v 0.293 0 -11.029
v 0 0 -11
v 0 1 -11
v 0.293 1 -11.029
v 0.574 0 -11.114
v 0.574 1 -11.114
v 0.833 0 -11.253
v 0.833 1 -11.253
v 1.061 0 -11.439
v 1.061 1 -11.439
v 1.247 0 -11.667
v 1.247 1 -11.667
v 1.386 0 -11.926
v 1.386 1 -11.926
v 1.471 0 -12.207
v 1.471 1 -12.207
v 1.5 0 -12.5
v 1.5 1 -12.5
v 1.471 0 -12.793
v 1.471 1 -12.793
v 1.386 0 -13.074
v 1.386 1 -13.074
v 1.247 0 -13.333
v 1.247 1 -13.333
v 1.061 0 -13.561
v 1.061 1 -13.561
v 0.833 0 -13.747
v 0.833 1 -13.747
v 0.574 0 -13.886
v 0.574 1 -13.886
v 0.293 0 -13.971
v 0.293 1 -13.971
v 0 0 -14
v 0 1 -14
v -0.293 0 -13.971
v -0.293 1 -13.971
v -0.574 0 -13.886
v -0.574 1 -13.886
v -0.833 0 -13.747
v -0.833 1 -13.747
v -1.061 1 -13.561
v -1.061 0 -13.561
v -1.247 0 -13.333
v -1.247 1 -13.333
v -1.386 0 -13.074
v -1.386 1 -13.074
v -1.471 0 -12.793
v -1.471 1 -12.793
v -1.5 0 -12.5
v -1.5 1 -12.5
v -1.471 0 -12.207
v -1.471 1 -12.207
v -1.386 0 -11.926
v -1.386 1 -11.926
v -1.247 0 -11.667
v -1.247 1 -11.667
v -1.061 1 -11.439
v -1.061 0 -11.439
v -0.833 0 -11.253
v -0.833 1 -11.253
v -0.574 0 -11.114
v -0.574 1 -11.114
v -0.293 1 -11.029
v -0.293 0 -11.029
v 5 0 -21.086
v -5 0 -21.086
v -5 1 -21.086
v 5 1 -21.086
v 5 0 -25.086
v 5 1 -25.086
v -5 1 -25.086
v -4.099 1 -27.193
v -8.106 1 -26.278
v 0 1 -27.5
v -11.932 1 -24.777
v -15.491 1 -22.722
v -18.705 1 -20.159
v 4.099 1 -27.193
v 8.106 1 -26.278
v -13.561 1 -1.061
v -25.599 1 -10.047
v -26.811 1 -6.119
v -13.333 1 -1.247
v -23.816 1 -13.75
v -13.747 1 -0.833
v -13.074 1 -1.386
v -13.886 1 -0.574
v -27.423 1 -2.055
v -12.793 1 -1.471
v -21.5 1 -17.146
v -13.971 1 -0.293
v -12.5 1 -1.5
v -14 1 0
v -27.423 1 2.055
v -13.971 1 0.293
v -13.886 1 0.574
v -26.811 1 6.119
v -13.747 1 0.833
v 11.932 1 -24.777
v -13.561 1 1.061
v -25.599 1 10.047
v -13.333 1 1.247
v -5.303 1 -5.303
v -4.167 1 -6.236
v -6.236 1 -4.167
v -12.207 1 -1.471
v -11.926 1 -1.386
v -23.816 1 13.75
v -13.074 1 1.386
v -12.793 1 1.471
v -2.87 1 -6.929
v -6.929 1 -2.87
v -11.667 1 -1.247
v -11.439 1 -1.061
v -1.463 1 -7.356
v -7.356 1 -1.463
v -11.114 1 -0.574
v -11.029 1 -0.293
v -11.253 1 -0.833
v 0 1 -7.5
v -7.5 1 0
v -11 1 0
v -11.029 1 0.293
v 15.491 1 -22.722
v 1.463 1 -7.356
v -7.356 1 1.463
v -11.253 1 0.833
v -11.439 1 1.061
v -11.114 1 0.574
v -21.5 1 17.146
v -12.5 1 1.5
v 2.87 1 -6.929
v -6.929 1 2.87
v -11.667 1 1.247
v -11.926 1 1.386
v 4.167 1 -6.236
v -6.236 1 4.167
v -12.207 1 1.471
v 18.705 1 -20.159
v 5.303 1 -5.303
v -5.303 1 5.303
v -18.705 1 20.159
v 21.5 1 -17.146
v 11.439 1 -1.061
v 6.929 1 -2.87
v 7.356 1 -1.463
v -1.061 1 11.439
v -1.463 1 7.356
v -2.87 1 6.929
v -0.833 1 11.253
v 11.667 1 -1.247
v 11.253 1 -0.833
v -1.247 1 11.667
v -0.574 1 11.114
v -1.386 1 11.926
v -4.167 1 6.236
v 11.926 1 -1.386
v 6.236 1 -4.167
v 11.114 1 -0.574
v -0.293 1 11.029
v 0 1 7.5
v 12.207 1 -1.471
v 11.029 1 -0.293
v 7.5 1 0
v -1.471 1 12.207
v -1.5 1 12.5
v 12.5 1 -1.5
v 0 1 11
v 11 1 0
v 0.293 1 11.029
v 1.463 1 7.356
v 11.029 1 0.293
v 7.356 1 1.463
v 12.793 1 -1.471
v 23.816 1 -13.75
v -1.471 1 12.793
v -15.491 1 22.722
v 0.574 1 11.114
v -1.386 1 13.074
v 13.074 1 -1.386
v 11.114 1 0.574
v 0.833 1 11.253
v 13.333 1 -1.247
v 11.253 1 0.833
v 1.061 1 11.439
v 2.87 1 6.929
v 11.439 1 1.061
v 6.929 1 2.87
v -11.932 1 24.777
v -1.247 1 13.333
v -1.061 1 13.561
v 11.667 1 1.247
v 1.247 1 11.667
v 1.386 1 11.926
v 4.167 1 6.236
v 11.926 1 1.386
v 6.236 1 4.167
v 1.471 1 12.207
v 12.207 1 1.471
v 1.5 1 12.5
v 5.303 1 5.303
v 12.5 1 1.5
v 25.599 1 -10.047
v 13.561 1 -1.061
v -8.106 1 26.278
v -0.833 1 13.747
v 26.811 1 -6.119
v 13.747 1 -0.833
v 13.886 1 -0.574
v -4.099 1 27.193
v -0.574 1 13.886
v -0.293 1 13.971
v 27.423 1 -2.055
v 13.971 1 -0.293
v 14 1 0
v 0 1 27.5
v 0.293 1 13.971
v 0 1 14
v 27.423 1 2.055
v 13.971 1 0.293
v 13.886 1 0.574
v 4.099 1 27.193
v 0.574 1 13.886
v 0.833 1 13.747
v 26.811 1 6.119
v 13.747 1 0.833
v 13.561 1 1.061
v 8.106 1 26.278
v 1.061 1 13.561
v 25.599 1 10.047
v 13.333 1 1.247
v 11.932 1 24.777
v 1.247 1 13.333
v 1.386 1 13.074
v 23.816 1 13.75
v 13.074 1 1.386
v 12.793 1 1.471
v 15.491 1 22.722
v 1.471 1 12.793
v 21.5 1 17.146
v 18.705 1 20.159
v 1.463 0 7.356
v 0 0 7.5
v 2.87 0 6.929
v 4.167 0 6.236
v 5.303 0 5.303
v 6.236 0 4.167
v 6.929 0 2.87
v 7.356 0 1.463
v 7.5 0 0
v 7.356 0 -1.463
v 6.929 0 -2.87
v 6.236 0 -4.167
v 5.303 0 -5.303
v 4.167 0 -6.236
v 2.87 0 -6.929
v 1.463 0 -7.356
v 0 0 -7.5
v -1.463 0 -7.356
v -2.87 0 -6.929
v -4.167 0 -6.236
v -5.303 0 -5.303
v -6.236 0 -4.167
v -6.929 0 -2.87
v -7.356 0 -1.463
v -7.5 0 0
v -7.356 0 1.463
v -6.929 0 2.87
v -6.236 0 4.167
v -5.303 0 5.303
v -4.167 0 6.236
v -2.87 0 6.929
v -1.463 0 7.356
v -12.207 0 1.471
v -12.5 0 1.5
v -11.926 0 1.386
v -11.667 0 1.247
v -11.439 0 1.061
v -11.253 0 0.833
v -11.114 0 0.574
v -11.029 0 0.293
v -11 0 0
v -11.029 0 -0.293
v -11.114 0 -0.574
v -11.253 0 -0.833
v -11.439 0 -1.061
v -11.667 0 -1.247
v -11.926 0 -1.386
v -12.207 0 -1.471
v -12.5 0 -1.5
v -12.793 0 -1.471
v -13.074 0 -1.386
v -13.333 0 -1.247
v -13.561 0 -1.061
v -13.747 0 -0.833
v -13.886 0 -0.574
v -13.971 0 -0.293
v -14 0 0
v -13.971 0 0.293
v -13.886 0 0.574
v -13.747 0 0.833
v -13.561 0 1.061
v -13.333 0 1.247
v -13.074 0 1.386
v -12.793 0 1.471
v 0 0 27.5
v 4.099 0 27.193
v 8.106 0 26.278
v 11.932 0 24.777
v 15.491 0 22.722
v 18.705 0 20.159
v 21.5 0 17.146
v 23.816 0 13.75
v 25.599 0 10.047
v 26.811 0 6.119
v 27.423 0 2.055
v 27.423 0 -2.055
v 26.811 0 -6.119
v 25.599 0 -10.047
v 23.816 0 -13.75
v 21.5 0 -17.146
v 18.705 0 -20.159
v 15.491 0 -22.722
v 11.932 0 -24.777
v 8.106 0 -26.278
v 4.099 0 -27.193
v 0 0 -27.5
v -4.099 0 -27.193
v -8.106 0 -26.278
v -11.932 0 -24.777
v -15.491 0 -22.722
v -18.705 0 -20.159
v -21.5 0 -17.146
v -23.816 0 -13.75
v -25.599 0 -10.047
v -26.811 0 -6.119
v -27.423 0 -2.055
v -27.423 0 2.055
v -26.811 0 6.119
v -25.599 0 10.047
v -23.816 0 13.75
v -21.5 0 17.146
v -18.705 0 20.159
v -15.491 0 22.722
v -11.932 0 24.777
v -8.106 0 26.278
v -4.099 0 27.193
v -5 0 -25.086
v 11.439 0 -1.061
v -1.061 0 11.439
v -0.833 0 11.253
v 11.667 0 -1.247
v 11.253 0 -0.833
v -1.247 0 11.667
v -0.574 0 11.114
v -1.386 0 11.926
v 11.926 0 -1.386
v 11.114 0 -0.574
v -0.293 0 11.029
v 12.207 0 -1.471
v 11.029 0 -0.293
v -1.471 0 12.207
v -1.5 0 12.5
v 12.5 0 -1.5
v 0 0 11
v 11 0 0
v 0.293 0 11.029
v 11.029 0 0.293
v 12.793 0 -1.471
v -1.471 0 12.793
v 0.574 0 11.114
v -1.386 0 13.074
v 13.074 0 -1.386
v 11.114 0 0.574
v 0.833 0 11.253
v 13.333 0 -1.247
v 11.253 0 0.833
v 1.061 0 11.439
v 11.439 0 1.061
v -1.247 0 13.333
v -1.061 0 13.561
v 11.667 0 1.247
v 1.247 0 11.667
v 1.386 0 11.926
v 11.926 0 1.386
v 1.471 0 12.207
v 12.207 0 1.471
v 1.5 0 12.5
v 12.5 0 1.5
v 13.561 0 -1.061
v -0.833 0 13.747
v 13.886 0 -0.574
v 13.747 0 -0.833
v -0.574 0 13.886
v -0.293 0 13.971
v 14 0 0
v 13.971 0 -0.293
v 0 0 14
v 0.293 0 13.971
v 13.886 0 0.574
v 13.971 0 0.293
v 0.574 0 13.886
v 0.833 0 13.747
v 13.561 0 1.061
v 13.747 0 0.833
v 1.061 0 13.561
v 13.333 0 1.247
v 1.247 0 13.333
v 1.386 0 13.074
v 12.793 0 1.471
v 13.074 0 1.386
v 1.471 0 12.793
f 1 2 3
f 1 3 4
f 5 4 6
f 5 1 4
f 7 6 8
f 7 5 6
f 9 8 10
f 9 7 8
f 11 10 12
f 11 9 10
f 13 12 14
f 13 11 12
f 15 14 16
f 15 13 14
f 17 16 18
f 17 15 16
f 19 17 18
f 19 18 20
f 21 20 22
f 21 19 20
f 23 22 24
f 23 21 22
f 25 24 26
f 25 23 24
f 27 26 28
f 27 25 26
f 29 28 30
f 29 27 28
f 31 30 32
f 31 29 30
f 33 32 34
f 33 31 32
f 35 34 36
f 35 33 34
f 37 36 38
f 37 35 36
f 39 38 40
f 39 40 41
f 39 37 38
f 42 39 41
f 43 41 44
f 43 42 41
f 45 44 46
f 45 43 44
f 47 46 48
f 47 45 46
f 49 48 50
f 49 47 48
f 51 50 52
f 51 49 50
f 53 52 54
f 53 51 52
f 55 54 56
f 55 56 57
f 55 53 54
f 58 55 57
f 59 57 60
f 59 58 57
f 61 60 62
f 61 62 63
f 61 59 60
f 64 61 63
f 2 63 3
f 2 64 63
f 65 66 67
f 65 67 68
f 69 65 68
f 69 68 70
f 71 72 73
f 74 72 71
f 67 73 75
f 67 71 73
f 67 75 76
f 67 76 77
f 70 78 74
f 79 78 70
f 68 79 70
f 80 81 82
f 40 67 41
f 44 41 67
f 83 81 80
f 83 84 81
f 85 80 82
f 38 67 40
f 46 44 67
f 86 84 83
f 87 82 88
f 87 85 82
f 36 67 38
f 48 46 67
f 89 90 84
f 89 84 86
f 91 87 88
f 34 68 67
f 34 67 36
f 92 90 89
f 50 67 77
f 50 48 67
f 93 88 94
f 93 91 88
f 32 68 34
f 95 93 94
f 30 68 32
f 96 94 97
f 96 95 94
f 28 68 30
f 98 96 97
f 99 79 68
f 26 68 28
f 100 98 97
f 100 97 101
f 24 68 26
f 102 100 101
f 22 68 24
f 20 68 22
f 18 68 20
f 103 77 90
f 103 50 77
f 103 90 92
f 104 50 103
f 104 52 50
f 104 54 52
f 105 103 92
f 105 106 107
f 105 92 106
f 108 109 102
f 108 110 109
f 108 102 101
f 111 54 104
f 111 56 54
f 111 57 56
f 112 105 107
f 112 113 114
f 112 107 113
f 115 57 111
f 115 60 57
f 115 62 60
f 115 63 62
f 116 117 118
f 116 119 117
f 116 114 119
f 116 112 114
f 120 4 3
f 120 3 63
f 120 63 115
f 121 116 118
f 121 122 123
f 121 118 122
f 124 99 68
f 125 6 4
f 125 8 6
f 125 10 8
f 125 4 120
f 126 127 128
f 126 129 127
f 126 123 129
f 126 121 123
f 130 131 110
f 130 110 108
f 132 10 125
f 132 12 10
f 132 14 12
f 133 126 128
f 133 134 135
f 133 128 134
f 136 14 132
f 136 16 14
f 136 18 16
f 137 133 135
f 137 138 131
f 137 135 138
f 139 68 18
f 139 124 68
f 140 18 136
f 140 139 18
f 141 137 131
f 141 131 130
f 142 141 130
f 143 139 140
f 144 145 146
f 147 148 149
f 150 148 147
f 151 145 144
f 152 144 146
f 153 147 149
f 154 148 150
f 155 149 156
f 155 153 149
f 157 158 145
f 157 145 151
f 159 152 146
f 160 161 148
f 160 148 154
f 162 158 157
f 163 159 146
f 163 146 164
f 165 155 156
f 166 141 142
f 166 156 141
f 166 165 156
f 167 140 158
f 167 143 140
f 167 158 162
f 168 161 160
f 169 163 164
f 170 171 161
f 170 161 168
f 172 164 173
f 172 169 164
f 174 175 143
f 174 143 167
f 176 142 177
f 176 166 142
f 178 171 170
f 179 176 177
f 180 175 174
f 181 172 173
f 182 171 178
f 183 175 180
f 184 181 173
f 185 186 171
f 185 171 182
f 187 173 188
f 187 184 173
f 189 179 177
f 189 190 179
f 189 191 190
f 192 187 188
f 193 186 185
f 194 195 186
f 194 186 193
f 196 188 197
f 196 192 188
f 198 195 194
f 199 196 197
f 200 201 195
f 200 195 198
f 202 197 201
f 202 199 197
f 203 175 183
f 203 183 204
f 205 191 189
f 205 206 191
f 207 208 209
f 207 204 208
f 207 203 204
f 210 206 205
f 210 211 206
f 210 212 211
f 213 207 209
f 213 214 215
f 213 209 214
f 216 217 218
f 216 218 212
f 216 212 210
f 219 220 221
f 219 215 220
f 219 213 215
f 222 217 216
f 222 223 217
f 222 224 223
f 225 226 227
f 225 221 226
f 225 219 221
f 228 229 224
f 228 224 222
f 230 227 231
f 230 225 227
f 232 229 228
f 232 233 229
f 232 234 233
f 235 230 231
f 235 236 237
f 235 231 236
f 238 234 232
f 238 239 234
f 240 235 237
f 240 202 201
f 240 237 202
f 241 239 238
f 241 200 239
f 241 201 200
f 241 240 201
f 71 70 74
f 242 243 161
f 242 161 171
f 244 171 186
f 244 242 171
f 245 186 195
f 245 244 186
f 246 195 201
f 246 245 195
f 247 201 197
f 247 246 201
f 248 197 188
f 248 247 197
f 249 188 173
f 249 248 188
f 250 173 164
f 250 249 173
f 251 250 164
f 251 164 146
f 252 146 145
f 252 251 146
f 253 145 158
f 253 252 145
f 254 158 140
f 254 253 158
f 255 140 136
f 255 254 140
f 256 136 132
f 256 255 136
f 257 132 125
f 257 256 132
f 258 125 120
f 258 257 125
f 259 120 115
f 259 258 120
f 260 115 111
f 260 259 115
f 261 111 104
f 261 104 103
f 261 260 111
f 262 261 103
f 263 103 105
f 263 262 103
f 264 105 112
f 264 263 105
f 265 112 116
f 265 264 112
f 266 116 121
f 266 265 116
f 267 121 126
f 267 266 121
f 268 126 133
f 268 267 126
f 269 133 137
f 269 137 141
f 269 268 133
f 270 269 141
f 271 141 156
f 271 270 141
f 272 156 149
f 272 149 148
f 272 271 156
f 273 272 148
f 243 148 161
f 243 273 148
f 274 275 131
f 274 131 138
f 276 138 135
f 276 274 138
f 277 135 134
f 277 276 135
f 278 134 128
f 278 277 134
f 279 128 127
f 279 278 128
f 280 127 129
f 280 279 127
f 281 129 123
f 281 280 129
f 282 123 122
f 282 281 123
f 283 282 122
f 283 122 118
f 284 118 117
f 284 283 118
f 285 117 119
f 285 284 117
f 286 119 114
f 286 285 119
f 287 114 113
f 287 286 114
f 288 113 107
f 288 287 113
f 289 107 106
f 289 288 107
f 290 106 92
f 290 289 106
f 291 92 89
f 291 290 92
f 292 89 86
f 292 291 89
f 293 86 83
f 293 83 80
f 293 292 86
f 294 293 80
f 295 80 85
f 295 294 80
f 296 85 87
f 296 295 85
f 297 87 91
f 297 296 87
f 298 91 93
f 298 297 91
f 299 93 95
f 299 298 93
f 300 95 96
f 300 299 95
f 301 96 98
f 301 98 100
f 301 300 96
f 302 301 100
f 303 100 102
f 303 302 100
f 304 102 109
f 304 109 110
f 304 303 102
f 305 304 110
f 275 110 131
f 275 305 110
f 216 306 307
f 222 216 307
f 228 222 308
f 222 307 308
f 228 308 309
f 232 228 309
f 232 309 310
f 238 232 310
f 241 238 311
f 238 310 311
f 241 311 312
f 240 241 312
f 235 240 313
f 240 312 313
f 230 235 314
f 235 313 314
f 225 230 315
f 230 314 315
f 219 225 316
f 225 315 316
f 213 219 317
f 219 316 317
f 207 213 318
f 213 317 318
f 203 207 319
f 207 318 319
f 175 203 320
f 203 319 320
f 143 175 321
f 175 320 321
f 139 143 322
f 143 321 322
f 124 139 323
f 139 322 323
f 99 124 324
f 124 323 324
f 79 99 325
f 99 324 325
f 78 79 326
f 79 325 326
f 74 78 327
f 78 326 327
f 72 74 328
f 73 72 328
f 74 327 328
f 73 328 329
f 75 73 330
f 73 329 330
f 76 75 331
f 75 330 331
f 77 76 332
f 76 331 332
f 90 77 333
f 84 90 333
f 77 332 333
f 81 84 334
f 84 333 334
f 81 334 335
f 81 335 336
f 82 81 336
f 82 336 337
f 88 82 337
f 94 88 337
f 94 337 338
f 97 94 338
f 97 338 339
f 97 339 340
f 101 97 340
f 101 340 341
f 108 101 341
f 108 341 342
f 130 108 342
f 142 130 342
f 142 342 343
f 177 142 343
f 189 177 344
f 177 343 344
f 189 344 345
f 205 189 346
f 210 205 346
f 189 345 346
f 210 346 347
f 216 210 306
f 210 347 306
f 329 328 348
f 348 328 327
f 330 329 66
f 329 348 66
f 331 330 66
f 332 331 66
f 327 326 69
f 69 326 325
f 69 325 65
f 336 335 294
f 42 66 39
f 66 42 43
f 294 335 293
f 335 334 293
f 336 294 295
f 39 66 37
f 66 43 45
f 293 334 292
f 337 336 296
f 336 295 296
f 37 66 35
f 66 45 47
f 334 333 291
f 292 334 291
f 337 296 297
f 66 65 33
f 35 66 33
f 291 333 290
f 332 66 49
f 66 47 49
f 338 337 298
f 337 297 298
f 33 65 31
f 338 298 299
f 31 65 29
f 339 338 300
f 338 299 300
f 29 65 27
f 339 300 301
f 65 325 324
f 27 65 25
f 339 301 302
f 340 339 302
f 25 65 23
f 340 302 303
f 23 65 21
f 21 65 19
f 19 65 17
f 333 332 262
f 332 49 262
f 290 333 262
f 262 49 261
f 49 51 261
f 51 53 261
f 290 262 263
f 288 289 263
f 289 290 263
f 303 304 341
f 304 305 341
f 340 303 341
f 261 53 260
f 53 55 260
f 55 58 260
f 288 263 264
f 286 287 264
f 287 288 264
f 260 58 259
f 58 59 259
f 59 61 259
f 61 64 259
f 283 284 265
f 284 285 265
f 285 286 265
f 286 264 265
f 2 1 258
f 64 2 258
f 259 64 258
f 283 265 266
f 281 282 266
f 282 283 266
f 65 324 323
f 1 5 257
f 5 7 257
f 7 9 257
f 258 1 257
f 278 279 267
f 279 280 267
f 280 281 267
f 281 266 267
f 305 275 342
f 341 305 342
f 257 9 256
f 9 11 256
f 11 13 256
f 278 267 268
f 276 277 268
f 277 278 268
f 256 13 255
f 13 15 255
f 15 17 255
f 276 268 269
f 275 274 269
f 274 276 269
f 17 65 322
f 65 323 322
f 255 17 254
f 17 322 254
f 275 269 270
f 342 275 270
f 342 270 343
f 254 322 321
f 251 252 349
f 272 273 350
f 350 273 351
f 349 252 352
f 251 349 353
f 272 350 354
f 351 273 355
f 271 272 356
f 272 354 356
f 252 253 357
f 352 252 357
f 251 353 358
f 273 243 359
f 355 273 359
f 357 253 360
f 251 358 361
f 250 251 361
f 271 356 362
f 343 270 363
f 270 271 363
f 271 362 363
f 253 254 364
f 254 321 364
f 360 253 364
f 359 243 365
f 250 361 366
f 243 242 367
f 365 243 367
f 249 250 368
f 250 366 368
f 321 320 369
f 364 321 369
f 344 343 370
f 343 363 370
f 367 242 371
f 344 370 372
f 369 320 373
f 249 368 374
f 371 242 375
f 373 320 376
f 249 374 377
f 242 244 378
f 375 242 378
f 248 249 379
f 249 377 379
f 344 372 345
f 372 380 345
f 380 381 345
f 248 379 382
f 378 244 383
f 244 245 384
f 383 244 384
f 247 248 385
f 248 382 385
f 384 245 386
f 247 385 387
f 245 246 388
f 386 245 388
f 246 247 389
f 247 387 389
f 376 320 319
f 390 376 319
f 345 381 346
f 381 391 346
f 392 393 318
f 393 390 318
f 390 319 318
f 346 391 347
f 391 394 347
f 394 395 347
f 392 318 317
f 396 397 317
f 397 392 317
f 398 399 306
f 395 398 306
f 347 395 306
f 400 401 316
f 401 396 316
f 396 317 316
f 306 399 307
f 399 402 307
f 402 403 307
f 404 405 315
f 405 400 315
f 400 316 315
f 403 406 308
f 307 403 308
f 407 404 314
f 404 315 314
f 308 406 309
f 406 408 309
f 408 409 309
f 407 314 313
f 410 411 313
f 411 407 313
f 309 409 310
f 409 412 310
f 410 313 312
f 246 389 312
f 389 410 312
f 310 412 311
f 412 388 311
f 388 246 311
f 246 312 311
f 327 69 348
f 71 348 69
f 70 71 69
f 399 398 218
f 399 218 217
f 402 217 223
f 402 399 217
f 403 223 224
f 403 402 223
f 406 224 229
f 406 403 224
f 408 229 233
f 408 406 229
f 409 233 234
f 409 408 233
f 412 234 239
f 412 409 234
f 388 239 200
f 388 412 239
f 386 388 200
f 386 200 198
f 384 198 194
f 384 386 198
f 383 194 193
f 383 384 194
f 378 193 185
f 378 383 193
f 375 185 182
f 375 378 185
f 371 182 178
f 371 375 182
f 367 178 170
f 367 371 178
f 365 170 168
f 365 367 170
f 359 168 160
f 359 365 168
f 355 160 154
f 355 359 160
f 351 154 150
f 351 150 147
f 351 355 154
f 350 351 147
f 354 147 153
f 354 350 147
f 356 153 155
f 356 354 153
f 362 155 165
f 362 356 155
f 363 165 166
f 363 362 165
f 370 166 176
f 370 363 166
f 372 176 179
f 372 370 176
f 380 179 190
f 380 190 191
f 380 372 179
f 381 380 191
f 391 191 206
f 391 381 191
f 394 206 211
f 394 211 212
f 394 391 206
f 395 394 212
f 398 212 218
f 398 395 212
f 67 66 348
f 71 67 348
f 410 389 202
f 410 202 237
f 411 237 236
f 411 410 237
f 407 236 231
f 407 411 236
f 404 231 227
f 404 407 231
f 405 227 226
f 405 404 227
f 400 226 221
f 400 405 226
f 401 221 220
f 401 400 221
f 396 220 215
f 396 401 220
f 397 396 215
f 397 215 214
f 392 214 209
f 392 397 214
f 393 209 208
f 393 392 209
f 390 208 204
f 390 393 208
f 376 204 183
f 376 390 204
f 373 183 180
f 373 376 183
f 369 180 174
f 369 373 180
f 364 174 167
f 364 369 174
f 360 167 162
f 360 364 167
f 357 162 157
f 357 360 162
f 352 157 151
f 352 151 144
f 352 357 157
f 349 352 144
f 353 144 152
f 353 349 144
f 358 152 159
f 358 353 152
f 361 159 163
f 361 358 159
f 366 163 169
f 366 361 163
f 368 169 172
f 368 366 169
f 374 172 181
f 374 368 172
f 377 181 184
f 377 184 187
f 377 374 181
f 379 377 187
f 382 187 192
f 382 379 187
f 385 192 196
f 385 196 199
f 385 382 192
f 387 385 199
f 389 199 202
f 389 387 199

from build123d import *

# Parameters (mm, degrees)
SKETCH1_R           = 27.5
SKETCH1_R_2         = 1.5
SKETCH1_R_3         = 7.5
SKETCH1_W           = 10
SKETCH1_H           = 4
BOSS_EXTRUDE1_DEPTH = 1


with BuildPart() as part:
    # Sketch1 → Boss-Extrude1 (new body)
    with BuildSketch(Plane(origin=(0, 0, 0), x_dir=(1, 0, 0), z_dir=(0, 1, 0))):
        with Locations(Location((0, 0, 0), (0, 0, 270))):
            Circle(SKETCH1_R)
        with Locations(Location((0, 12.5, 0), (0, 0, 270))):
            Circle(SKETCH1_R_2, mode=Mode.SUBTRACT)
        with Locations(Location((12.5, 0, 0), (0, 0, 270))):
            Circle(SKETCH1_R_2, mode=Mode.SUBTRACT)
        with Locations(Location((0, -12.5, 0), (0, 0, 270))):
            Circle(SKETCH1_R_2, mode=Mode.SUBTRACT)
        with Locations(Location((-12.5, 0, 0), (0, 0, 270))):
            Circle(SKETCH1_R_2, mode=Mode.SUBTRACT)
        with Locations(Location((0, 0, 0), (0, 0, 270))):
            Circle(SKETCH1_R_3, mode=Mode.SUBTRACT)
        with Locations((0, 23.086362523)):
            Rectangle(SKETCH1_W, SKETCH1_H, mode=Mode.SUBTRACT)
    extrude(amount=BOSS_EXTRUDE1_DEPTH)


solid = part.part
